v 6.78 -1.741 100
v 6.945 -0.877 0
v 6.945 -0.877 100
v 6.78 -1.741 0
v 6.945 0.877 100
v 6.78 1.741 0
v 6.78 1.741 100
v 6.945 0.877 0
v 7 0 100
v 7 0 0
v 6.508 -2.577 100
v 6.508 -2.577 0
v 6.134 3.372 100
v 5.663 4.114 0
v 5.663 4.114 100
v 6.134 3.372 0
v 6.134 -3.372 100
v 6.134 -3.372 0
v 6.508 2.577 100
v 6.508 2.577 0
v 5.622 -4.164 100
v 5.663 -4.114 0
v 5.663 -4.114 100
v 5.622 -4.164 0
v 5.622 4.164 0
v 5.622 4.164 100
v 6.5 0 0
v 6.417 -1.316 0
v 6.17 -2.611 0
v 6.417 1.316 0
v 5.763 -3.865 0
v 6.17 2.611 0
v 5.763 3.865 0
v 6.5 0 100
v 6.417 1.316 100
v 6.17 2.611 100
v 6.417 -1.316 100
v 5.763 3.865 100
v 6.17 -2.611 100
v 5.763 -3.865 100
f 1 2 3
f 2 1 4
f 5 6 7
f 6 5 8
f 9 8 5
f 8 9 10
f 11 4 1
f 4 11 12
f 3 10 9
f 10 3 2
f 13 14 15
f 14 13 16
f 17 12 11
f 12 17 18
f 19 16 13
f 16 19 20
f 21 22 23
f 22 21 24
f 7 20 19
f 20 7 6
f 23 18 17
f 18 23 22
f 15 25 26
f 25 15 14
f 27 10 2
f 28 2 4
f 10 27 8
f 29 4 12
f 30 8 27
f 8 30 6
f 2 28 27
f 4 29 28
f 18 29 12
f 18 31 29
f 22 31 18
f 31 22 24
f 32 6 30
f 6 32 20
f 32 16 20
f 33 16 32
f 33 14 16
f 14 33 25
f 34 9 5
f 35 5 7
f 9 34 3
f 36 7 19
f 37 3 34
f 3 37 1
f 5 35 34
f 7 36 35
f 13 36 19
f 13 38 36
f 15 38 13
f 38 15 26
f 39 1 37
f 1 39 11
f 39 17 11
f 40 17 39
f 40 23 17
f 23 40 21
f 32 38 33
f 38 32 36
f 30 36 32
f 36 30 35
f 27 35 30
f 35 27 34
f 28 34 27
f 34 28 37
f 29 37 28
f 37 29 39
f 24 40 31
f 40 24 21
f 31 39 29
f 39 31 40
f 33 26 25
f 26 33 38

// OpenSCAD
$fn = 50;


difference() {
	union() {
		cylinder(h = 100, r = 7.0000000000);
		translate(v = [-7.0000000000, 0, 0]) {
			cylinder(h = 100, r = 7.0000000000);
		}
	}
	union() {
		cylinder(h = 100, r = 3.2500000000);
		cylinder(h = 100, r = 1.8000000000);
		cylinder(h = 100, r = 1.8000000000);
		cylinder(h = 100, r = 1.8000000000);
		translate(v = [-11.5000000000, 0, 0]) {
			hull() {
				translate(v = [-3.7500000000, 0.0000000000, 0]) {
					cylinder(h = 100, r = 7.5000000000);
				}
				translate(v = [3.7500000000, 0.0000000000, 0]) {
					cylinder(h = 100, r = 7.5000000000);
				}
				translate(v = [-3.7500000000, -0.0000000000, 0]) {
					cylinder(h = 100, r = 7.5000000000);
				}
				translate(v = [3.7500000000, -0.0000000000, 0]) {
					cylinder(h = 100, r = 7.5000000000);
				}
			}
		}
		translate(v = [-4.0000000000, 0, 0.0000000000]) {
			cylinder(h = 100, r = 10.5000000000);
		}
	}
}
